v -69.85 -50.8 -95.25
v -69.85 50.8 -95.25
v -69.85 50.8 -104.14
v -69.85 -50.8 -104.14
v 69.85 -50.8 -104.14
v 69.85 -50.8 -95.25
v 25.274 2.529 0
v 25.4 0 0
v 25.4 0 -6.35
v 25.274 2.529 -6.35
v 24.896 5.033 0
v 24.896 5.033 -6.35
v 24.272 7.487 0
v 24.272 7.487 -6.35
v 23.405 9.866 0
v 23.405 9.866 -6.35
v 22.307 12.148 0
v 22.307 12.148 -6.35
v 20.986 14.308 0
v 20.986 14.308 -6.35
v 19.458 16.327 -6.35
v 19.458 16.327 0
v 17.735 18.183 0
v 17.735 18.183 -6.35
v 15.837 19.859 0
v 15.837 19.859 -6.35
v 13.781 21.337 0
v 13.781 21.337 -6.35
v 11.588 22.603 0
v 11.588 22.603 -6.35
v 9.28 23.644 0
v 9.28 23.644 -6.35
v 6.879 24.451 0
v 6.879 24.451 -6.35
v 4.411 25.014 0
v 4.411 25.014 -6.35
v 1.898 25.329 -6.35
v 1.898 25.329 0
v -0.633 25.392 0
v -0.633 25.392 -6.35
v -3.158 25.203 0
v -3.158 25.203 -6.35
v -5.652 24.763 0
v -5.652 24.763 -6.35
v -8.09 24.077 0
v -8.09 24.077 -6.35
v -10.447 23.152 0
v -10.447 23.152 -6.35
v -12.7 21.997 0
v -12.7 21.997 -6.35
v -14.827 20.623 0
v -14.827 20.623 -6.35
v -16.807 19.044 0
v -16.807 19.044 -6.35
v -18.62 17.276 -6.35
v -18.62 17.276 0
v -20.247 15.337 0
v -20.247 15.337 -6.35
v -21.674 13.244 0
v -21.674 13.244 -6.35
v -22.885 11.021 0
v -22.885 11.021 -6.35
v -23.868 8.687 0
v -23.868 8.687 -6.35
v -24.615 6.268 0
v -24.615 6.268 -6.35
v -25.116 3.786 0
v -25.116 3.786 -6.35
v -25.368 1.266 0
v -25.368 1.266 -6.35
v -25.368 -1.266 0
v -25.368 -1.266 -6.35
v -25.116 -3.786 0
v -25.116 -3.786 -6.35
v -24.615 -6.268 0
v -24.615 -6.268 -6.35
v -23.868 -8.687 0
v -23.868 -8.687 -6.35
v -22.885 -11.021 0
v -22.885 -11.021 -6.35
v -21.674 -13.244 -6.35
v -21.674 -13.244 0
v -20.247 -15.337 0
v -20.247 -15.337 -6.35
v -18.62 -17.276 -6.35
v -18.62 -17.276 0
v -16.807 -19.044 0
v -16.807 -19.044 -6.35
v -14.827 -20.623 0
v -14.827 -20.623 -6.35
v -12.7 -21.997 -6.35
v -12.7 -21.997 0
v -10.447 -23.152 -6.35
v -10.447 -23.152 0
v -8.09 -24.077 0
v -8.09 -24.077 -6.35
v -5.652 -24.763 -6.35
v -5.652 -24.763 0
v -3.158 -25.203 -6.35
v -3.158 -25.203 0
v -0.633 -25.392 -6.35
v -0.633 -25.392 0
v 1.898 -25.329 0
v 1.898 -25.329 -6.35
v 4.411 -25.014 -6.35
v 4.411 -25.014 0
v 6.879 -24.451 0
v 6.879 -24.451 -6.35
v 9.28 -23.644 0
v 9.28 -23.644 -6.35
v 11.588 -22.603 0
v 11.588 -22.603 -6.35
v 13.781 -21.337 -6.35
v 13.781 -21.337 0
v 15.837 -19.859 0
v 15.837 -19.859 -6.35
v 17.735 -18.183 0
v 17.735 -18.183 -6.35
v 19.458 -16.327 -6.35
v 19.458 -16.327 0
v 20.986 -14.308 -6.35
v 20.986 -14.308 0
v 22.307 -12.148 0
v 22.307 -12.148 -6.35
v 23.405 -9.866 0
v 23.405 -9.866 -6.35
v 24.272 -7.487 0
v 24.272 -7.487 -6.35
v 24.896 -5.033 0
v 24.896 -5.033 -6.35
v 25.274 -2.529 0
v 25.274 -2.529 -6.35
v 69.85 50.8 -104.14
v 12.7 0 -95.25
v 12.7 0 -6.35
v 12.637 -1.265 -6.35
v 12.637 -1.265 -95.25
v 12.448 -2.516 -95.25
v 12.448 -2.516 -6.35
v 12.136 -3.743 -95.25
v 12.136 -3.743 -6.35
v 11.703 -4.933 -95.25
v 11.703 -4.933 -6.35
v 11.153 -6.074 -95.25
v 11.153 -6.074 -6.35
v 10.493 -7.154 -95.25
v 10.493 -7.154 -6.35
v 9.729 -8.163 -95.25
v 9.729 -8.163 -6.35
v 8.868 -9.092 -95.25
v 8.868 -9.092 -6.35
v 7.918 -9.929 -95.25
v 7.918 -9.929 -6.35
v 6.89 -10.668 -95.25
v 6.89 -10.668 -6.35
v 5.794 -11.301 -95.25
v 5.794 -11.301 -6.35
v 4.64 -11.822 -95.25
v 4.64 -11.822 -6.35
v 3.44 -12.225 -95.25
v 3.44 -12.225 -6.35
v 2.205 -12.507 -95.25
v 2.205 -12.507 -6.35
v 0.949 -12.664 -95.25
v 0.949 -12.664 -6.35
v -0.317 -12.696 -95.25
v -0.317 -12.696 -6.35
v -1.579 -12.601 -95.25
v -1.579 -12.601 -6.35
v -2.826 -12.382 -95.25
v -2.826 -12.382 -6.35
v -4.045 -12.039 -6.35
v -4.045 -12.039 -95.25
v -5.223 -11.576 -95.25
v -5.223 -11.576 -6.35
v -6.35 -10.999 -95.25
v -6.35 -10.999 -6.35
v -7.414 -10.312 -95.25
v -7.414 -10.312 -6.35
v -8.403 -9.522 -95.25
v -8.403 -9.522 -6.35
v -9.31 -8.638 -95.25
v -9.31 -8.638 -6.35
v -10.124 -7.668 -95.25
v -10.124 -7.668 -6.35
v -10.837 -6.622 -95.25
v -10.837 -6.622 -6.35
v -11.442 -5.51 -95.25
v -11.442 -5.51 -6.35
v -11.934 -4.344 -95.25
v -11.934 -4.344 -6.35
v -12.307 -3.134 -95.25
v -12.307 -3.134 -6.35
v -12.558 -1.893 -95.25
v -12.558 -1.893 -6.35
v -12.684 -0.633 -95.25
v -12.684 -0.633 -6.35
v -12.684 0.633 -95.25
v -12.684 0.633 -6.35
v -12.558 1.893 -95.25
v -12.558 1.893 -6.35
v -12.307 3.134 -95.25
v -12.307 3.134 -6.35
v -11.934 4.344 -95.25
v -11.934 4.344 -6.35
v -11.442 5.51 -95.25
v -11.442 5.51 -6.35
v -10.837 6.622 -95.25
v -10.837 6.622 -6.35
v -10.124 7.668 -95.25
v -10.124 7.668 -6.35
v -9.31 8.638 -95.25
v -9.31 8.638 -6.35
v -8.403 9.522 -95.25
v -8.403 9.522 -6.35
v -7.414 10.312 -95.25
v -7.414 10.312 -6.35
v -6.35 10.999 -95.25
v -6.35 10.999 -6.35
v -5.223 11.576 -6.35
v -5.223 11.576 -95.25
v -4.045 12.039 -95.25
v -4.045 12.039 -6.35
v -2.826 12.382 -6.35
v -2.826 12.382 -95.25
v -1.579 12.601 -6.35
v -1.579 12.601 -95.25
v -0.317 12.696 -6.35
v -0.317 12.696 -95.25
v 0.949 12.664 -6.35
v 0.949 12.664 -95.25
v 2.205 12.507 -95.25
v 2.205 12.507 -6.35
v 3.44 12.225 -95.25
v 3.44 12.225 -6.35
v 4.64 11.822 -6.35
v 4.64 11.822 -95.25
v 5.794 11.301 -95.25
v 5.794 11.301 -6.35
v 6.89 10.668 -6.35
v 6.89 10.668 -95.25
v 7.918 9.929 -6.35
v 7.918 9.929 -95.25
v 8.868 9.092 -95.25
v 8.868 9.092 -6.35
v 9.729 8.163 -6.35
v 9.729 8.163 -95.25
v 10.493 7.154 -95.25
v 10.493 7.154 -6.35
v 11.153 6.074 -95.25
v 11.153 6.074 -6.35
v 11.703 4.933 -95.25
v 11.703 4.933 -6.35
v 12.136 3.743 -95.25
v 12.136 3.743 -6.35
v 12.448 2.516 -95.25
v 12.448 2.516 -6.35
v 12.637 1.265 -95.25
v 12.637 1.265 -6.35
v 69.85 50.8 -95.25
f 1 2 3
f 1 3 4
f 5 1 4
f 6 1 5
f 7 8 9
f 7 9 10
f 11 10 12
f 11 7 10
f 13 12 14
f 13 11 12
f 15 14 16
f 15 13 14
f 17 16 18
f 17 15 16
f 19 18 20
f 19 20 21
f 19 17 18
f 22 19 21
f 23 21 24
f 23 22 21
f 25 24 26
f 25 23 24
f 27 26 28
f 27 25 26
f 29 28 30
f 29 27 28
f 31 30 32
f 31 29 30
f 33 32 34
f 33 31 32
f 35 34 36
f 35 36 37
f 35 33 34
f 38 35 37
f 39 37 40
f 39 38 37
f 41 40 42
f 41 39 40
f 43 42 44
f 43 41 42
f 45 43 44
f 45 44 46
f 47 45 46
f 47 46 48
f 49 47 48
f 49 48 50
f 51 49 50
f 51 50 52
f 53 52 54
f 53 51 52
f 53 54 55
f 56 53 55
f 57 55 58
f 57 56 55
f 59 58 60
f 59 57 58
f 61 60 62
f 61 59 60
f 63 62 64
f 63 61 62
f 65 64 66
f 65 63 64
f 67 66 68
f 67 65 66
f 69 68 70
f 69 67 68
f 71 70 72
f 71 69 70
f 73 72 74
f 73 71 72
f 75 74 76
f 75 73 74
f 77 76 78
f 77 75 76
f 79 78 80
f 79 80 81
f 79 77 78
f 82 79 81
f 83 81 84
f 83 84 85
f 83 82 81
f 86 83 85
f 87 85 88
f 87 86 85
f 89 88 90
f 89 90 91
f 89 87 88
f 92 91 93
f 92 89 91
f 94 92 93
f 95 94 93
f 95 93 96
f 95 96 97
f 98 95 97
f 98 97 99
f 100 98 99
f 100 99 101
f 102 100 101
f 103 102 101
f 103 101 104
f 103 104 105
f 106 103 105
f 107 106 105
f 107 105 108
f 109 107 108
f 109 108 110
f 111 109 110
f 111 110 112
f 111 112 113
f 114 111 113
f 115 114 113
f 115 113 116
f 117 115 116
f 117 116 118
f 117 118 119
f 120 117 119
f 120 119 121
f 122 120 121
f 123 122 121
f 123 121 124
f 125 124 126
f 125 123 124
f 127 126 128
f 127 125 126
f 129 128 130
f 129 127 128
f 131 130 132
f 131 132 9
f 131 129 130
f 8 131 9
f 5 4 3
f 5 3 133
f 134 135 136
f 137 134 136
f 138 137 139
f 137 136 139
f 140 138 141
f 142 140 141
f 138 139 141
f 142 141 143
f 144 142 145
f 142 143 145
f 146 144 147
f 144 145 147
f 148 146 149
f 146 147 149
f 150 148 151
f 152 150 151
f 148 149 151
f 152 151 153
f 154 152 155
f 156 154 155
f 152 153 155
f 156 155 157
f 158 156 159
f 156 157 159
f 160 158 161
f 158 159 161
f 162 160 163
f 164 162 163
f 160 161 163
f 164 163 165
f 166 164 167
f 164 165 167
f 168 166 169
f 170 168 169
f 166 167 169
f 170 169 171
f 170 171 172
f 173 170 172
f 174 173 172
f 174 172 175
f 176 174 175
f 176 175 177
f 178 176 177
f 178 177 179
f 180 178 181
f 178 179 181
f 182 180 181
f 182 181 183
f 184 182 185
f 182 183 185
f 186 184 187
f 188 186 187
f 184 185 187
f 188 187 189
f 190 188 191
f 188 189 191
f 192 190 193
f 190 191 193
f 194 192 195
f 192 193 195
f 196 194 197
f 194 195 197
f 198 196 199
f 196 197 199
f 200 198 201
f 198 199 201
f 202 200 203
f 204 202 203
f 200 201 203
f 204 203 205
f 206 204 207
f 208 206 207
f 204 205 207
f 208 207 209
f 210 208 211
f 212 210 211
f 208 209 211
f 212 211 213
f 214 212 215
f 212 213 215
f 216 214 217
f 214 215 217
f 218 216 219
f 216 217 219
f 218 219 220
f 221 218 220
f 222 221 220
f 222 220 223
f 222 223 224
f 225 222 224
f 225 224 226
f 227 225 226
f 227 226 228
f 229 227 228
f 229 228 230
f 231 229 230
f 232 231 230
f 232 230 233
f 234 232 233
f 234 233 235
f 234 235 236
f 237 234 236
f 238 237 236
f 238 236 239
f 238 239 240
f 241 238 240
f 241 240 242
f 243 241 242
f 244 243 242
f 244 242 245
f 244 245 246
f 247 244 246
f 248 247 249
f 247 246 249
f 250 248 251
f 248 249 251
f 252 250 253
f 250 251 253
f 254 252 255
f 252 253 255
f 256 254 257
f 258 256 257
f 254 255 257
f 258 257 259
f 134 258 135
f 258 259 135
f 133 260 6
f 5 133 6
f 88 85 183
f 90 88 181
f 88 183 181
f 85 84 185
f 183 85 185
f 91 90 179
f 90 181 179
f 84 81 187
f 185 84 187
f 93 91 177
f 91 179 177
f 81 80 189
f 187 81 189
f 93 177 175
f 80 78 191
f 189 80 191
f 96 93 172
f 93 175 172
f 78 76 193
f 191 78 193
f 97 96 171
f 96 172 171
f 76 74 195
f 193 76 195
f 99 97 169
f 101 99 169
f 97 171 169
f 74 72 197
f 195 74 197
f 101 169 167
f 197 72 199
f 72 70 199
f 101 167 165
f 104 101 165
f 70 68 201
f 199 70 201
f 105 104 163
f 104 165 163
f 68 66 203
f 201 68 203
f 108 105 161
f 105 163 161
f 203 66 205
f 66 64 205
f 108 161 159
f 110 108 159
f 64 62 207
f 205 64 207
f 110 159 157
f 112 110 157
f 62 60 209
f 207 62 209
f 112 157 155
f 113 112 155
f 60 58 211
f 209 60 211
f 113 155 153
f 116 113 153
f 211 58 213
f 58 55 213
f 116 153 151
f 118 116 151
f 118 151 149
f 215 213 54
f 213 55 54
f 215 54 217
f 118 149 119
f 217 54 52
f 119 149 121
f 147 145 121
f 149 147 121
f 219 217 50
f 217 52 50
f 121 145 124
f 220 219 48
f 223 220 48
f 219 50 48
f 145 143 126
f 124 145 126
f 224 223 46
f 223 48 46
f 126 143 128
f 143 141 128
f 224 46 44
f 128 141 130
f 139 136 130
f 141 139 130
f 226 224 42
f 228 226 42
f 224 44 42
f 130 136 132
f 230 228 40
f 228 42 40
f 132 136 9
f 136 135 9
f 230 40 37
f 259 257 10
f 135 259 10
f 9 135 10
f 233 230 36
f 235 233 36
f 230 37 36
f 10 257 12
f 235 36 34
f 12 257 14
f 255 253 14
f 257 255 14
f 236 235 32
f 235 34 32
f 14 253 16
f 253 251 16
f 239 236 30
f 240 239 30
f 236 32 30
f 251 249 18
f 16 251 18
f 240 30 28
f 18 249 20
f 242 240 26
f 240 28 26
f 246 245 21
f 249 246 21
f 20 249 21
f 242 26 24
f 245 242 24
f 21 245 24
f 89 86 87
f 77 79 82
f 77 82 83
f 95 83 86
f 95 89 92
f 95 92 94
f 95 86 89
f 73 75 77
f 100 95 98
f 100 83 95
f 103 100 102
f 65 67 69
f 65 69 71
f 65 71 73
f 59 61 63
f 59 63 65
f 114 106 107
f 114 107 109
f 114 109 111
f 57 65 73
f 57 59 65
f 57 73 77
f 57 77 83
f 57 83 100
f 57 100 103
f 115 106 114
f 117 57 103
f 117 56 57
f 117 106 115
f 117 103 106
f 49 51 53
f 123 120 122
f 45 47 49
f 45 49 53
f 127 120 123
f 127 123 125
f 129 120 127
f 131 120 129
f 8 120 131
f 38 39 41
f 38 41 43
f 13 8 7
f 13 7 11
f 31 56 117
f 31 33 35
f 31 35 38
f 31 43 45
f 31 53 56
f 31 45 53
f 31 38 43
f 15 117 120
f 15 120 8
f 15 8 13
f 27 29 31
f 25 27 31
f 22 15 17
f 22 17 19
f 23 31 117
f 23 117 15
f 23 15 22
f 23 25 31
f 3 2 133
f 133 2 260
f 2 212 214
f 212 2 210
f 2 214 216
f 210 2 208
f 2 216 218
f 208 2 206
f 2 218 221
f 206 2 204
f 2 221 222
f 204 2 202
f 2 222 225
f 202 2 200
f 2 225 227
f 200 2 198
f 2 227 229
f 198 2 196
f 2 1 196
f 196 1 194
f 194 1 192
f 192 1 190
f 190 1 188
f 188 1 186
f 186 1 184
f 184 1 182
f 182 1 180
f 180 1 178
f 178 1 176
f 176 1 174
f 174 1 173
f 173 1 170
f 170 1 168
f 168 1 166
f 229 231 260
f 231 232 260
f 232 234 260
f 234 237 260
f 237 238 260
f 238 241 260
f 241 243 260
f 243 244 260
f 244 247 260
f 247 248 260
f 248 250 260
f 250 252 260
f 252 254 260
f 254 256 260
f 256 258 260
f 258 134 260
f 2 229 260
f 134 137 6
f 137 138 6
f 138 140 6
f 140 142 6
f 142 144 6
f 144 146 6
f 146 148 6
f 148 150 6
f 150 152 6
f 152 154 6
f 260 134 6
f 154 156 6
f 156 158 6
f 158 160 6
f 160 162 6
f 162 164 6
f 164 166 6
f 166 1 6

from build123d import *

# Parameters (mm, degrees)
F0_R     = 25.4
F1_DEPTH = 6.35
F2_R     = 12.7
F3_DEPTH = 88.9
F4_W     = 139.7
F4_H     = 101.6
F5_DEPTH = 8.89


with BuildPart() as f1:
    # F0 (on Top) → F1 (new body)
    with BuildSketch(Plane.XY):
        Circle(F0_R)
    extrude(amount=-F1_DEPTH)

    # F2 (on face) → F3 (join)
    with BuildSketch(Plane(origin=(0, 0, -6.35), x_dir=(1, 0, 0), z_dir=(0, 0, -1))):
        Circle(F2_R)
    extrude(amount=F3_DEPTH)

    # F4 (on face) → F5 (join)
    with BuildSketch(Plane(origin=(0, 0, -95.25), x_dir=(1, 0, 0), z_dir=(0, 0, -1))):
        Rectangle(F4_W, F4_H)
    extrude(amount=F5_DEPTH)


solid = f1.part
